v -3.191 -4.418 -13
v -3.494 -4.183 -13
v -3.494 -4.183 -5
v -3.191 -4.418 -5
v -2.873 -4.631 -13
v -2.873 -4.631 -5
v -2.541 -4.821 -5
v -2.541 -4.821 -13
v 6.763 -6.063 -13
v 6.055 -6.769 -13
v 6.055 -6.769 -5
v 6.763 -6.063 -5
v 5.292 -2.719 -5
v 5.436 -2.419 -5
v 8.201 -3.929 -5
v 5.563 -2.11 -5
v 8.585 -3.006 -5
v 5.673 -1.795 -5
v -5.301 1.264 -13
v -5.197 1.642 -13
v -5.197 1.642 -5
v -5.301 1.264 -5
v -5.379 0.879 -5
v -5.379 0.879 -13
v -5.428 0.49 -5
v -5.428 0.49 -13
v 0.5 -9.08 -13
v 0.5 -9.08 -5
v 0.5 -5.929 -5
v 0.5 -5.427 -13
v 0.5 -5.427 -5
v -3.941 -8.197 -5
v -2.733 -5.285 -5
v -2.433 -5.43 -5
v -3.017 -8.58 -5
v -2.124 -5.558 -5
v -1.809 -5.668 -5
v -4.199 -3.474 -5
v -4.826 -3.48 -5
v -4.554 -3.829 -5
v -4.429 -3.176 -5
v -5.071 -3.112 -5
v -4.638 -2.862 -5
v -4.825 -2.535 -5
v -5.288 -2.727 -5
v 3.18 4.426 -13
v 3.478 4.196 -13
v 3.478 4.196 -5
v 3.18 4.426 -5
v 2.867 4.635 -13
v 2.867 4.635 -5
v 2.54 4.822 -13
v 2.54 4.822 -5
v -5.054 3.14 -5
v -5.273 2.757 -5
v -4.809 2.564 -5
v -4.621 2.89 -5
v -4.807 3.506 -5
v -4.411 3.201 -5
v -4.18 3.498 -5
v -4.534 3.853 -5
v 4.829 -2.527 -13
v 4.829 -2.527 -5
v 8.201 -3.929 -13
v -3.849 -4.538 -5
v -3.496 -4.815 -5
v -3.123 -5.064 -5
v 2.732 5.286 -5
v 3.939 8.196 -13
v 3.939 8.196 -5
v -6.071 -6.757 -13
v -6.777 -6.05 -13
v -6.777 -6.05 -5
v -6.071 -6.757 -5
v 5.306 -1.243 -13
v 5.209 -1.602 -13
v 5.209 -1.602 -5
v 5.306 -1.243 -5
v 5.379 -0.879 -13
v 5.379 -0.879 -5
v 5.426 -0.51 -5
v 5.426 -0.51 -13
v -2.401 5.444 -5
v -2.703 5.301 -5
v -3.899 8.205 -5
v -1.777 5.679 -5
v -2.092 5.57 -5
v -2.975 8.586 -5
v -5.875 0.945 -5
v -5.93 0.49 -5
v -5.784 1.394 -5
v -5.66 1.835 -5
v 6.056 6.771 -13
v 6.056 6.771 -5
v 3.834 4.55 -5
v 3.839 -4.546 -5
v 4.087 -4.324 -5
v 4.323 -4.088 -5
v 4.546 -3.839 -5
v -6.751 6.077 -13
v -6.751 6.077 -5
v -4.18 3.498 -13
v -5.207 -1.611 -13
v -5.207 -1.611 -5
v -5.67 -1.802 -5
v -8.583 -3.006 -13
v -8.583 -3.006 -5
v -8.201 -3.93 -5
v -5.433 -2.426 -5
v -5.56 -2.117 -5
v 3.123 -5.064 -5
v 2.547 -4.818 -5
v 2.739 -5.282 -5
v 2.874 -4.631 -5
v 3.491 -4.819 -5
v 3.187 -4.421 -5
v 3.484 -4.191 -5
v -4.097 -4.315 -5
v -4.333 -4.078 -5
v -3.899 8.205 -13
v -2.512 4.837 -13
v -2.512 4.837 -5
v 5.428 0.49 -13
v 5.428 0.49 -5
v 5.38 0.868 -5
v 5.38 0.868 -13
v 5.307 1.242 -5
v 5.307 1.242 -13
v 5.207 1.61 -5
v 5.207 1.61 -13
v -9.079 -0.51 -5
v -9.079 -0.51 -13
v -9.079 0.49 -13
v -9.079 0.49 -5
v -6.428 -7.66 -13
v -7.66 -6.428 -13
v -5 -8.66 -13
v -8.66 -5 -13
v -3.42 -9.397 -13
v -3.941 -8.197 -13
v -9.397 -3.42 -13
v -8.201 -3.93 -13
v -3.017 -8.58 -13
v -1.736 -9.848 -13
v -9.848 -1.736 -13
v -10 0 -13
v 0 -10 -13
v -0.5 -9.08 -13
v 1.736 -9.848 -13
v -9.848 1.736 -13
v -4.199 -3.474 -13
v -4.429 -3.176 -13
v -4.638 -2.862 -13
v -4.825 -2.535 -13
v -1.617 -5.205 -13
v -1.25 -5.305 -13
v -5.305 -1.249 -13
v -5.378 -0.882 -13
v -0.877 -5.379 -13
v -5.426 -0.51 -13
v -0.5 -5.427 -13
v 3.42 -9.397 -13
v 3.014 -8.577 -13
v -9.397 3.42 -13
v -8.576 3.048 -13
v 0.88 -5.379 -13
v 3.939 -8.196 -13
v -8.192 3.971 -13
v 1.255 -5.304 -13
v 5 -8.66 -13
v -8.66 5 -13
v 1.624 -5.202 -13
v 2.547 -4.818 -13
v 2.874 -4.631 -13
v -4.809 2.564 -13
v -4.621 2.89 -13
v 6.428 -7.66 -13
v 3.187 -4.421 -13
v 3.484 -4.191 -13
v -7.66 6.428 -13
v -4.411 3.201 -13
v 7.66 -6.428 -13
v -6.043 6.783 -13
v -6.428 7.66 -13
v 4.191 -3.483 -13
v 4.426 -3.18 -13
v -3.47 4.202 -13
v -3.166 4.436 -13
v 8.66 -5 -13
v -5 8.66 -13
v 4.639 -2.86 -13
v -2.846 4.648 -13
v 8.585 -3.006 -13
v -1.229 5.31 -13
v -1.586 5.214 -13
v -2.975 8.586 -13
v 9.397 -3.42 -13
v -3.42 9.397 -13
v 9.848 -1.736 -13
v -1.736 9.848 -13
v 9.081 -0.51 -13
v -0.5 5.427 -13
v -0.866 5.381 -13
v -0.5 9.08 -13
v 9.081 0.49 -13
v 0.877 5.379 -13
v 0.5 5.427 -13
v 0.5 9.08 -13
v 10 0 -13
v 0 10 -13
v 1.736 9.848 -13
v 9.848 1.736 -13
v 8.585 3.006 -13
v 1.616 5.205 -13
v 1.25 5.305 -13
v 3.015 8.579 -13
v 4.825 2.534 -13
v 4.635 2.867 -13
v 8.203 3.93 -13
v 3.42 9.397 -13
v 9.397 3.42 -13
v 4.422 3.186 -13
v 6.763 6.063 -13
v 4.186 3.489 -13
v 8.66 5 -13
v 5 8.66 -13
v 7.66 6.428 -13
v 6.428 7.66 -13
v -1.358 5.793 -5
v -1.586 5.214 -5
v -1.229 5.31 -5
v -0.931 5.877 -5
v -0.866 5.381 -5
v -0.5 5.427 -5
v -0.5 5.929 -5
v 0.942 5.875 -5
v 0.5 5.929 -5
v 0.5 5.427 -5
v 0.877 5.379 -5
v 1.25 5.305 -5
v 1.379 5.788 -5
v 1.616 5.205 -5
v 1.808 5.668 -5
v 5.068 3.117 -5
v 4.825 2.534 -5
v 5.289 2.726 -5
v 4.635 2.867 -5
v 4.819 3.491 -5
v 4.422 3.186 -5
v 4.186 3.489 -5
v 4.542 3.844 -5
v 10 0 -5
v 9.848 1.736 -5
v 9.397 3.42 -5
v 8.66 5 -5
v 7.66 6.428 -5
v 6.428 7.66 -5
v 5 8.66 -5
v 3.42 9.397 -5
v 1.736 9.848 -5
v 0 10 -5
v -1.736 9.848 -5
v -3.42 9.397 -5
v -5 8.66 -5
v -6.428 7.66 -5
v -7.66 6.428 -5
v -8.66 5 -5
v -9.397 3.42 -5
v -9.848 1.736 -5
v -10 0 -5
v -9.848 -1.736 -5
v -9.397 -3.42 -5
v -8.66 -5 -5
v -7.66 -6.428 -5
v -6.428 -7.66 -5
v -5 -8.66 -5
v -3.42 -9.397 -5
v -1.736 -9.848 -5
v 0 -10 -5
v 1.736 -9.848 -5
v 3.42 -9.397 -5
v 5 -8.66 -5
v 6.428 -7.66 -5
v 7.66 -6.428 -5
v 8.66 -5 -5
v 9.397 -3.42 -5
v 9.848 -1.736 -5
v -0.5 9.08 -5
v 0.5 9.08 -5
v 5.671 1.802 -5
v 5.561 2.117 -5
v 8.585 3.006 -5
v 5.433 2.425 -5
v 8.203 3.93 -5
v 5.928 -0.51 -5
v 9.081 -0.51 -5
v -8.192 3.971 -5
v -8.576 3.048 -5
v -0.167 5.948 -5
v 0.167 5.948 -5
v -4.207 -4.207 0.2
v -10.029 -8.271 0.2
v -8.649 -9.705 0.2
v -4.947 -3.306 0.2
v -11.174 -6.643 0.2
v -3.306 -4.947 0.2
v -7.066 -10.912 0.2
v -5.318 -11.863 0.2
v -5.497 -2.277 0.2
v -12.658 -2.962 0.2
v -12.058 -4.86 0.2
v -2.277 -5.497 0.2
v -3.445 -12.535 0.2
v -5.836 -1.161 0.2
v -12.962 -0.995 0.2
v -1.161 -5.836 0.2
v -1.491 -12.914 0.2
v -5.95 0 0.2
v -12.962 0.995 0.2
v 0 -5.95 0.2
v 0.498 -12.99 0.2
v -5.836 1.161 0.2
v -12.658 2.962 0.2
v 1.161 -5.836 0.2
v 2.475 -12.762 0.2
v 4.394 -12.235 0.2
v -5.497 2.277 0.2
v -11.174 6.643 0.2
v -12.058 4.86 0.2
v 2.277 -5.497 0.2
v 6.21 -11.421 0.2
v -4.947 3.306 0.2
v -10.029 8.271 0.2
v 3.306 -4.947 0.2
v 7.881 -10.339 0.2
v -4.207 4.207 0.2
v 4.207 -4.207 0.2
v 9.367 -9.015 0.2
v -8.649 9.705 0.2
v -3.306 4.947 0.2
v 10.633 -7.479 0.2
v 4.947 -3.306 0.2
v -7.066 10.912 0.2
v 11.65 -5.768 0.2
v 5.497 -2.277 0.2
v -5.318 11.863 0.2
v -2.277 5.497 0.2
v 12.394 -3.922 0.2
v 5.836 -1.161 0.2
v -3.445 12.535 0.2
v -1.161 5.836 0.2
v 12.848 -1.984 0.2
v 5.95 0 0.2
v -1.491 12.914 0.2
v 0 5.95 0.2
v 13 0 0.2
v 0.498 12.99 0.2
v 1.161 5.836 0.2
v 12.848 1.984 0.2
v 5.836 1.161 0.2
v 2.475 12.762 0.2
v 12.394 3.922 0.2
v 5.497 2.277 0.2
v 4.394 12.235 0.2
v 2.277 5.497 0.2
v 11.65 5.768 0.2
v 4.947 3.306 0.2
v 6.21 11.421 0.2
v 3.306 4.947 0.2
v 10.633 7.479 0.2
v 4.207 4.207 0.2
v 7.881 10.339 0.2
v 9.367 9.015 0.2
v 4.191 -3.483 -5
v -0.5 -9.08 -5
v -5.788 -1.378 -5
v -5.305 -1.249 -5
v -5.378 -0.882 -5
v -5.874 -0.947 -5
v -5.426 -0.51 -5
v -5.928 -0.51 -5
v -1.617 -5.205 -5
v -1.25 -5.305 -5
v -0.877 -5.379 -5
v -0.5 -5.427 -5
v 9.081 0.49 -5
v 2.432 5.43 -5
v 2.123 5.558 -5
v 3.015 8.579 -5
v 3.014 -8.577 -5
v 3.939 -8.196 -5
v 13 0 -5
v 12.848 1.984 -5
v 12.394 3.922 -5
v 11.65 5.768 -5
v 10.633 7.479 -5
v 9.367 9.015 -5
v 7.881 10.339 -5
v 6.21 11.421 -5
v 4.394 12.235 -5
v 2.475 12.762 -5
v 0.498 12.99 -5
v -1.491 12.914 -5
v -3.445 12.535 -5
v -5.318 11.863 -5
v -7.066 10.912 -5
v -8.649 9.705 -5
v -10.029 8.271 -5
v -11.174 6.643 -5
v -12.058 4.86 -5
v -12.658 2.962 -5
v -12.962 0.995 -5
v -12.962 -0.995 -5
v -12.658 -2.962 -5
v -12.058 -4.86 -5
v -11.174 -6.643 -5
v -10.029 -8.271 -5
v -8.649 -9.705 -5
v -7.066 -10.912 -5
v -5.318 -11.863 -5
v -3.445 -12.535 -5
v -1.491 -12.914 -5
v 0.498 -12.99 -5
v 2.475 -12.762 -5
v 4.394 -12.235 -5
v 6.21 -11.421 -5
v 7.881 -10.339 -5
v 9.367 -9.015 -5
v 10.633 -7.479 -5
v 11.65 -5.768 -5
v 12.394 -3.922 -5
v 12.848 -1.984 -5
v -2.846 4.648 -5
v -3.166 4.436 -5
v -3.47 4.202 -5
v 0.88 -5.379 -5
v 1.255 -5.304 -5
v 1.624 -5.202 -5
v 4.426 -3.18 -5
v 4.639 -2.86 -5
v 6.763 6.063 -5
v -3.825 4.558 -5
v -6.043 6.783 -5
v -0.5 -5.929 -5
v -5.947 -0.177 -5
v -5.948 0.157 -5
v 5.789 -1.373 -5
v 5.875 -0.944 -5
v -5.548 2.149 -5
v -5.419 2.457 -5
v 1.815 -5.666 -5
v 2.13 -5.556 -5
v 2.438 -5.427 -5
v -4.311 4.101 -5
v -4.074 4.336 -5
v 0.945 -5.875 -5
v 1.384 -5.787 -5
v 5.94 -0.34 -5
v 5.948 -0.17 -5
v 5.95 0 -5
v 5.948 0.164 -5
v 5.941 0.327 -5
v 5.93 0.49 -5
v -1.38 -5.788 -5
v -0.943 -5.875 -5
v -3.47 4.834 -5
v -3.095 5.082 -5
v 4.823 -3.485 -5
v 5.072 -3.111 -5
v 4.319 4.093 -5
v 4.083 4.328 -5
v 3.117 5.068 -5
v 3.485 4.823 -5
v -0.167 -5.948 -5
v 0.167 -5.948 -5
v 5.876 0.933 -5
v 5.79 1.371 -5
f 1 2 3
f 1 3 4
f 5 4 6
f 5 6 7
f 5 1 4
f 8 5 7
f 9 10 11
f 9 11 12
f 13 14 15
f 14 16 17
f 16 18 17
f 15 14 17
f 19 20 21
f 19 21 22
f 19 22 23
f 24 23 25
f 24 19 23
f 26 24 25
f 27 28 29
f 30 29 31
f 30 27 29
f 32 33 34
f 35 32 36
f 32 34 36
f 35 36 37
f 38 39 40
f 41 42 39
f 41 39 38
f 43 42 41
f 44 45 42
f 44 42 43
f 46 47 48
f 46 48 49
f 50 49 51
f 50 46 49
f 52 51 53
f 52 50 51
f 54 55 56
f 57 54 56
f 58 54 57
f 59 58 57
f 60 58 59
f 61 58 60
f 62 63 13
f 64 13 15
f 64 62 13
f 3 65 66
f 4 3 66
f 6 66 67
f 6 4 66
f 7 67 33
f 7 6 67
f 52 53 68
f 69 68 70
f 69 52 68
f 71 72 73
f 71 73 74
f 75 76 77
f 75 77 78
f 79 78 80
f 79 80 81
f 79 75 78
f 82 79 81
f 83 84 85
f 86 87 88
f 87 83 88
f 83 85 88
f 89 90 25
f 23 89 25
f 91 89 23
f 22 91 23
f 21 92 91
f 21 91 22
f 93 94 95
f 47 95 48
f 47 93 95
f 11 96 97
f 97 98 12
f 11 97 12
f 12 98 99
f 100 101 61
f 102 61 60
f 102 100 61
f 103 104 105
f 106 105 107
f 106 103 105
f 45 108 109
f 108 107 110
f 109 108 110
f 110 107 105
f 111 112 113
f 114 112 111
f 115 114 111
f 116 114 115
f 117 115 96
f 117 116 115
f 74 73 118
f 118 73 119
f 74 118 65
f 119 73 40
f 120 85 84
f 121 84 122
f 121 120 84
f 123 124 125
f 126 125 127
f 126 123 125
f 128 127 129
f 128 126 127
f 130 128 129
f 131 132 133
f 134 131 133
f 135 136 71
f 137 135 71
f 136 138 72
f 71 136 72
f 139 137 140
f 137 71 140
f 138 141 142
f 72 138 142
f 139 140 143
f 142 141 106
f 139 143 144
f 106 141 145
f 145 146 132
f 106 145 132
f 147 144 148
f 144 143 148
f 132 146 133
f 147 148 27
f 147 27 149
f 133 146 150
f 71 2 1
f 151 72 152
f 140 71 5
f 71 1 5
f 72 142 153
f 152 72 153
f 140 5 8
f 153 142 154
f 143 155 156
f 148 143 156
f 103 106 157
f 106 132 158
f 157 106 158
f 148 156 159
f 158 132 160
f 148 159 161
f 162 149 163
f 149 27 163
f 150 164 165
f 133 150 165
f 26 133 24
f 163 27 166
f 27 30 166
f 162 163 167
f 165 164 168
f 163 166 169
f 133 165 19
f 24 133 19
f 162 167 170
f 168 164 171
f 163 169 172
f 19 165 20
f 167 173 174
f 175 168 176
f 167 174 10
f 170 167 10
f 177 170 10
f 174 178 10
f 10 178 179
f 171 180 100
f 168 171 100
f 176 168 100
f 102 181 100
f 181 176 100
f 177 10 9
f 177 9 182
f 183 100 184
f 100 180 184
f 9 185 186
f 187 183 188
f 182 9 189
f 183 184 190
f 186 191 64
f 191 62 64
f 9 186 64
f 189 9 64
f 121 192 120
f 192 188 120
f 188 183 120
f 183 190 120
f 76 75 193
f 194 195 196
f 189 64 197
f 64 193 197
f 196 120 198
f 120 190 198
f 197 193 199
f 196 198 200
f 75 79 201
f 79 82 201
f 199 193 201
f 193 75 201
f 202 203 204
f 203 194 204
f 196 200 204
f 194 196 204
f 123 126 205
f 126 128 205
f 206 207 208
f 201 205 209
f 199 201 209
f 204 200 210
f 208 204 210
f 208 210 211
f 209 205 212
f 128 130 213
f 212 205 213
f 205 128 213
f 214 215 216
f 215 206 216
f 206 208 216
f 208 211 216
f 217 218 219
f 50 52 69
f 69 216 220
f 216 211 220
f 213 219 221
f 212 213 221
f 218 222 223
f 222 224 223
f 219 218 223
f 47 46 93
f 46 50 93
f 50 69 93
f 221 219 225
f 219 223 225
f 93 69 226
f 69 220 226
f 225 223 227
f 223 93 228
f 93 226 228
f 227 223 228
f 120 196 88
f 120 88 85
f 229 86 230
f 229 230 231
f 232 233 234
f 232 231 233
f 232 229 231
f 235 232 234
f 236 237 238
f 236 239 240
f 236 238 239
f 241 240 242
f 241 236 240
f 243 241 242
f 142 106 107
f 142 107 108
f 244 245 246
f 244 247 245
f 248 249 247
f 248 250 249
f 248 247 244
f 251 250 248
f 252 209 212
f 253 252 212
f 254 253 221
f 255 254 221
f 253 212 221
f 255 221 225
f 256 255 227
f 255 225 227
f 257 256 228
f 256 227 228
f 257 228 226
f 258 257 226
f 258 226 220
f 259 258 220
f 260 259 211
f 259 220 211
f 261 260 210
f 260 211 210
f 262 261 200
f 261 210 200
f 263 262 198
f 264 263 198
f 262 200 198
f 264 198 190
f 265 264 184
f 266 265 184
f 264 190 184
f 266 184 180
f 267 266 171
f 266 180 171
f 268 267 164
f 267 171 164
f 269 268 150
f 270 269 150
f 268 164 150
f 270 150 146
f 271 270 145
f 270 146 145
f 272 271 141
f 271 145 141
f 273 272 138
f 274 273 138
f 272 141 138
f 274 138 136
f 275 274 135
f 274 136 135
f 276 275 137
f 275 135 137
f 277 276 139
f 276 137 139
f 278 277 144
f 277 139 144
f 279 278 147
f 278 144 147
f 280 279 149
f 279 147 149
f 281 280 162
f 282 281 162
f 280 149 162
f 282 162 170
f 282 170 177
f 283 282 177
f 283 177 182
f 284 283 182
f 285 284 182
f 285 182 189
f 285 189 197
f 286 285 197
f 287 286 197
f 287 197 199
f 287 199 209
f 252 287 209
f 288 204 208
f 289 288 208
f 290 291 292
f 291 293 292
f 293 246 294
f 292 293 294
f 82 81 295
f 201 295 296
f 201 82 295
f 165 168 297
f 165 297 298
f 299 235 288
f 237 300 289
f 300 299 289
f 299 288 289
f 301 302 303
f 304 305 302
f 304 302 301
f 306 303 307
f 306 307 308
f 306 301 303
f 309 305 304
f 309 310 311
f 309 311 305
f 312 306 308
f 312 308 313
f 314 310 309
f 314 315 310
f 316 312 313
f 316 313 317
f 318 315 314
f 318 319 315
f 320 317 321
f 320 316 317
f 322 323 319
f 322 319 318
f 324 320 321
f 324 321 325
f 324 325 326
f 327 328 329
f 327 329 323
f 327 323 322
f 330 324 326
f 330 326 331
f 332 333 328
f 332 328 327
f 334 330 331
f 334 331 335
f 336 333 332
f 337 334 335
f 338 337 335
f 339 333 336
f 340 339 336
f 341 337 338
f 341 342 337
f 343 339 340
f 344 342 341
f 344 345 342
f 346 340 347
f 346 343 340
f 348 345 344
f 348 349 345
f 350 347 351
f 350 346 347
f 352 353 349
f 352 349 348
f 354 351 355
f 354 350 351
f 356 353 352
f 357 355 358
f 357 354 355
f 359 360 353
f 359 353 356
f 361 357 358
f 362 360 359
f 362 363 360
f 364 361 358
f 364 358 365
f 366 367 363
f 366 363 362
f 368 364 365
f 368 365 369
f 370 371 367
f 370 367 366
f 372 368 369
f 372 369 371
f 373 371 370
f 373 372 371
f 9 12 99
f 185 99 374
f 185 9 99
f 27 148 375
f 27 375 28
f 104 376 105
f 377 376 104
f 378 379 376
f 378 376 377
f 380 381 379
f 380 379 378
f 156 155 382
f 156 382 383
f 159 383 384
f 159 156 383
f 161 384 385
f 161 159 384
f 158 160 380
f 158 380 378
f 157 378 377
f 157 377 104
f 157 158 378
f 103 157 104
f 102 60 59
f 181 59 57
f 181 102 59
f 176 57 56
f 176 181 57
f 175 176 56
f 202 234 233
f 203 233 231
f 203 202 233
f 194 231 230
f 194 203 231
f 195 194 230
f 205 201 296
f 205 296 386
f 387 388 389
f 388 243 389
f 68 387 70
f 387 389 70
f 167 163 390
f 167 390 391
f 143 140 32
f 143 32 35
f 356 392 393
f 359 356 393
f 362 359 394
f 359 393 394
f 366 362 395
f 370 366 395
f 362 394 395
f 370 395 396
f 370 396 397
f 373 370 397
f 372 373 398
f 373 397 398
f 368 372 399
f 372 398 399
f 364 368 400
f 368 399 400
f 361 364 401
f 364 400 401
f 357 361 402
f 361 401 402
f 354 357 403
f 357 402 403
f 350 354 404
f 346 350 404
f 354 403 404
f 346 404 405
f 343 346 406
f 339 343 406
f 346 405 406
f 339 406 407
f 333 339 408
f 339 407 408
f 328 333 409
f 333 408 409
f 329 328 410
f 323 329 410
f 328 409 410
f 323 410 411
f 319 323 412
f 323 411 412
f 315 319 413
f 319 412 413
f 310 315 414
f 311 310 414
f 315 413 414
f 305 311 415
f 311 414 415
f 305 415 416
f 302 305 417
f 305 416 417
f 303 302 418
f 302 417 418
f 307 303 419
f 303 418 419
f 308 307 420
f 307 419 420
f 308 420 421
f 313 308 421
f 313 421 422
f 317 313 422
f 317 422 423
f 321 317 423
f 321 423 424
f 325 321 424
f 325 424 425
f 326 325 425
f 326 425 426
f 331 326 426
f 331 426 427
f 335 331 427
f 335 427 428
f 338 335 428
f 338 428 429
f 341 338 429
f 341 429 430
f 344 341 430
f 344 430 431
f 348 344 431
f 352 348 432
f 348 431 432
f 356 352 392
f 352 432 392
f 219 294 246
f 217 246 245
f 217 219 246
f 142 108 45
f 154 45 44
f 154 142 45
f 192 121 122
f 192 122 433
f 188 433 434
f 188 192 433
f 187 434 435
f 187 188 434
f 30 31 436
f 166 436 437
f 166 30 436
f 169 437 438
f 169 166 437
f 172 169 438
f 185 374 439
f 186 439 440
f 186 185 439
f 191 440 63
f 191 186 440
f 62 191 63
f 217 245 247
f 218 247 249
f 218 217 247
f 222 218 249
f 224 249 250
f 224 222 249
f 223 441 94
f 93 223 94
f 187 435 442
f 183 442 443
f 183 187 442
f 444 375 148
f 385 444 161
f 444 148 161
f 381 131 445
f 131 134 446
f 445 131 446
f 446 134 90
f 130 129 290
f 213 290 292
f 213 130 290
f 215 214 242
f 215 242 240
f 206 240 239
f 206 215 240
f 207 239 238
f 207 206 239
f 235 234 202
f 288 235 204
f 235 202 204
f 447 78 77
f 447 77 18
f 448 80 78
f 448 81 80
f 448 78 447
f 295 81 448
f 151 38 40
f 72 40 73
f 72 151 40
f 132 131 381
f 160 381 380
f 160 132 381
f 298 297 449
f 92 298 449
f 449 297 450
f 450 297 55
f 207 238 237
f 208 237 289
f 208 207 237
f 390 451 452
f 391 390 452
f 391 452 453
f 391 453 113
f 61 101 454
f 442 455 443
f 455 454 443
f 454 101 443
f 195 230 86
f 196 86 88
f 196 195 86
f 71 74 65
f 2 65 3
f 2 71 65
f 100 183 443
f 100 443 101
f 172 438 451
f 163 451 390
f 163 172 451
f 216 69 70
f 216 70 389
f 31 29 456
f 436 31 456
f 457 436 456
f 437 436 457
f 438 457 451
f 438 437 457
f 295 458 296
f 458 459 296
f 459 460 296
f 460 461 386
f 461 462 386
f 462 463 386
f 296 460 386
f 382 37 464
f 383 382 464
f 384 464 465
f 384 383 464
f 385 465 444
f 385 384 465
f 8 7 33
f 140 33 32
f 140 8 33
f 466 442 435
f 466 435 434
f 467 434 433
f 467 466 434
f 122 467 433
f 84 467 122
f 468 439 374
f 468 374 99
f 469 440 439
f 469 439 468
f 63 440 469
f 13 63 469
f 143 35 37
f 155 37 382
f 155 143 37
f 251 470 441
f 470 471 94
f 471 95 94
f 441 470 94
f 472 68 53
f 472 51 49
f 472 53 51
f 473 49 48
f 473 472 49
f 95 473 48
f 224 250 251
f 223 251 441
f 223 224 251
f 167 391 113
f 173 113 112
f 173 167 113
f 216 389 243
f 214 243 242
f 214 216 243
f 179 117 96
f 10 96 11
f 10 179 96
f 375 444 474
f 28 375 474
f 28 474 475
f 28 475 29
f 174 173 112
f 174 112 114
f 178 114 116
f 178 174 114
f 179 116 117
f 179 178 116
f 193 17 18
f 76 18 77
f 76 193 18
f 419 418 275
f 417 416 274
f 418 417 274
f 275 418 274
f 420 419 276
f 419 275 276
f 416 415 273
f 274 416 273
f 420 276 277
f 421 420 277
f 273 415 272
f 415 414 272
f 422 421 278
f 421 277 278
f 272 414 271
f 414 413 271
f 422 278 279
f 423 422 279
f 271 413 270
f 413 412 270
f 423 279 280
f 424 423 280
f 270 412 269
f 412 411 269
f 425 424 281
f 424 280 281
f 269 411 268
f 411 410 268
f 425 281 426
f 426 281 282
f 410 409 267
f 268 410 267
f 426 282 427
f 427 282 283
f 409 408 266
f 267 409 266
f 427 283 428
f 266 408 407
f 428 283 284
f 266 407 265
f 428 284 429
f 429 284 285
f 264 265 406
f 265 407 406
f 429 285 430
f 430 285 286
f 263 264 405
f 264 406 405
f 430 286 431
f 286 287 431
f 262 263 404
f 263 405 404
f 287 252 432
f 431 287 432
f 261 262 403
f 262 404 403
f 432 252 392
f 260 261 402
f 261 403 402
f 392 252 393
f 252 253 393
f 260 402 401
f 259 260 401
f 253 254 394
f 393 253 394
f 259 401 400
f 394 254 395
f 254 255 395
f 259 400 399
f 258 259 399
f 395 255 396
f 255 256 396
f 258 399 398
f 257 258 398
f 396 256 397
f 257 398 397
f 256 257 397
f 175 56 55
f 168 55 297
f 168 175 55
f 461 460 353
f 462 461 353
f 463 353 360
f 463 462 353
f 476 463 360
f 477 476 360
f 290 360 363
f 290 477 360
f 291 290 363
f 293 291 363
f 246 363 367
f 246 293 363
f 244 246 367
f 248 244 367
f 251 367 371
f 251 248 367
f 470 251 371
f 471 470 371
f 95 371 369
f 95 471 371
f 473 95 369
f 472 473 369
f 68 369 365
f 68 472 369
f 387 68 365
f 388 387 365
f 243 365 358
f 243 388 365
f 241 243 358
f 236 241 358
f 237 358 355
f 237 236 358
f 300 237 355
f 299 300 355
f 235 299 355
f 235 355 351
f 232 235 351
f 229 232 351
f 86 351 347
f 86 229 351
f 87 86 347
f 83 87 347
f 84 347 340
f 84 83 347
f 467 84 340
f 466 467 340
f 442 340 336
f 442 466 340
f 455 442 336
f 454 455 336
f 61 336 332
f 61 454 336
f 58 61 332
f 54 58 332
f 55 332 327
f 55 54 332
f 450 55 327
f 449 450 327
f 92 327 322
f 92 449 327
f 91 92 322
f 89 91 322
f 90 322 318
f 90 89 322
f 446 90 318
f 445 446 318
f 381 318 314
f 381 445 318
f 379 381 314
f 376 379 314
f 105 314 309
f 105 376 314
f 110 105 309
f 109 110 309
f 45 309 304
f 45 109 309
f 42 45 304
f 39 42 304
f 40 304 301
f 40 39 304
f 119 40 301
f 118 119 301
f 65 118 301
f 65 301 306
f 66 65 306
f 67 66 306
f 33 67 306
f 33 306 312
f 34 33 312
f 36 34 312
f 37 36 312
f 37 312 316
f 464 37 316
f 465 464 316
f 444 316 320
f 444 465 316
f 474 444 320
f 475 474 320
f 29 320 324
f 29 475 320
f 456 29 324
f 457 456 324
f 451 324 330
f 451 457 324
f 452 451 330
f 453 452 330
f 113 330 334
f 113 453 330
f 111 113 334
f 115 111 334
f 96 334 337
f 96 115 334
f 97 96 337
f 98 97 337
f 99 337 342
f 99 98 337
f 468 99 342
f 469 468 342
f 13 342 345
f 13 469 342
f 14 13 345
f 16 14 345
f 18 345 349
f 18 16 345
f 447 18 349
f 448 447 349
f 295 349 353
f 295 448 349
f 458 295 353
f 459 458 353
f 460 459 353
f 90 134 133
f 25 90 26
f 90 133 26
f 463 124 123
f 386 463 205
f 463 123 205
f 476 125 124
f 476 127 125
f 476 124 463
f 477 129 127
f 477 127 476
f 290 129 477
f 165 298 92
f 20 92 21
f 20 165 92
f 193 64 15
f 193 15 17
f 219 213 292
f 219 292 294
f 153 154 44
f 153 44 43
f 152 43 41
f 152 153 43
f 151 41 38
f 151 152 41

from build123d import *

# Parameters (mm, degrees)
SKETCH006_R   = 13
SKETCH006_R_2 = 5.95
PAD003_DEPTH  = 5.2
SKETCH_R      = 10
SKETCH_R_2    = 5.45
PAD_DEPTH     = 8
SKETCH002_W   = 1
SKETCH002_H   = 18.16
SKETCH002_W_2 = 18.16
SKETCH002_H_2 = 1
POCKET_DEPTH  = 13


with BuildPart() as linear_bearing_holder:
    # Sketch006 → Pad003 (new body)
    with BuildSketch(Plane.XY):
        Circle(SKETCH006_R)
        Circle(SKETCH006_R_2, mode=Mode.SUBTRACT)
    extrude(amount=PAD003_DEPTH)


with BuildPart() as linearbearingfusion:
    # Sketch → Pad (new body)
    with BuildSketch(Plane.XY):
        Circle(SKETCH_R)
        Circle(SKETCH_R_2, mode=Mode.SUBTRACT)
    extrude(amount=PAD_DEPTH)

    # Sketch002 → Pocket (cut)
    with BuildSketch(Plane.XY):
        Rectangle(SKETCH002_W, SKETCH002_H)
        Polygon((3.015215, 8.578896), (-3.940517, -8.197161), (-3.016771, -8.580167), (3.938961, 8.19589), align=None)
        Polygon((6.056348, 6.770742), (-6.77744, -6.049612), (-6.070703, -6.757089), (6.763084, 6.063266), align=None)
        Polygon((8.203481, 3.930131), (-8.582606, -3.005738), (-8.200729, -3.929951), (8.585358, 3.005918), align=None)
        with Locations((0.000556, -0.009993)):
            Rectangle(SKETCH002_W_2, SKETCH002_H_2)
        Polygon((8.585358, -3.005918), (-8.191917, 3.970918), (-8.57589, 3.047573), (8.201385, -3.929262), align=None)
        Polygon((6.763084, -6.063266), (-6.042956, 6.783069), (-6.751173, 6.077074), (6.054867, -6.769261), align=None)
        Polygon((3.938961, -8.19589), (-2.974592, 8.585961), (-3.899205, 8.205052), (3.014349, -8.576799), align=None)
    extrude(amount=POCKET_DEPTH, mode=Mode.SUBTRACT)


with BuildPart() as linearbearingfusion_1:
    # Body placement: moved
    add(linearbearingfusion.part.moved(Location((0, 0, -8))))

    # Fusion002: union linear_bearing_holder
    add(linear_bearing_holder.part)


with BuildPart() as linearbearingfusion_2:
    # Fusion002 placement: moved
    add(linearbearingfusion_1.part.moved(Location((0, 0, -5))))


solid = linearbearingfusion_2.part
